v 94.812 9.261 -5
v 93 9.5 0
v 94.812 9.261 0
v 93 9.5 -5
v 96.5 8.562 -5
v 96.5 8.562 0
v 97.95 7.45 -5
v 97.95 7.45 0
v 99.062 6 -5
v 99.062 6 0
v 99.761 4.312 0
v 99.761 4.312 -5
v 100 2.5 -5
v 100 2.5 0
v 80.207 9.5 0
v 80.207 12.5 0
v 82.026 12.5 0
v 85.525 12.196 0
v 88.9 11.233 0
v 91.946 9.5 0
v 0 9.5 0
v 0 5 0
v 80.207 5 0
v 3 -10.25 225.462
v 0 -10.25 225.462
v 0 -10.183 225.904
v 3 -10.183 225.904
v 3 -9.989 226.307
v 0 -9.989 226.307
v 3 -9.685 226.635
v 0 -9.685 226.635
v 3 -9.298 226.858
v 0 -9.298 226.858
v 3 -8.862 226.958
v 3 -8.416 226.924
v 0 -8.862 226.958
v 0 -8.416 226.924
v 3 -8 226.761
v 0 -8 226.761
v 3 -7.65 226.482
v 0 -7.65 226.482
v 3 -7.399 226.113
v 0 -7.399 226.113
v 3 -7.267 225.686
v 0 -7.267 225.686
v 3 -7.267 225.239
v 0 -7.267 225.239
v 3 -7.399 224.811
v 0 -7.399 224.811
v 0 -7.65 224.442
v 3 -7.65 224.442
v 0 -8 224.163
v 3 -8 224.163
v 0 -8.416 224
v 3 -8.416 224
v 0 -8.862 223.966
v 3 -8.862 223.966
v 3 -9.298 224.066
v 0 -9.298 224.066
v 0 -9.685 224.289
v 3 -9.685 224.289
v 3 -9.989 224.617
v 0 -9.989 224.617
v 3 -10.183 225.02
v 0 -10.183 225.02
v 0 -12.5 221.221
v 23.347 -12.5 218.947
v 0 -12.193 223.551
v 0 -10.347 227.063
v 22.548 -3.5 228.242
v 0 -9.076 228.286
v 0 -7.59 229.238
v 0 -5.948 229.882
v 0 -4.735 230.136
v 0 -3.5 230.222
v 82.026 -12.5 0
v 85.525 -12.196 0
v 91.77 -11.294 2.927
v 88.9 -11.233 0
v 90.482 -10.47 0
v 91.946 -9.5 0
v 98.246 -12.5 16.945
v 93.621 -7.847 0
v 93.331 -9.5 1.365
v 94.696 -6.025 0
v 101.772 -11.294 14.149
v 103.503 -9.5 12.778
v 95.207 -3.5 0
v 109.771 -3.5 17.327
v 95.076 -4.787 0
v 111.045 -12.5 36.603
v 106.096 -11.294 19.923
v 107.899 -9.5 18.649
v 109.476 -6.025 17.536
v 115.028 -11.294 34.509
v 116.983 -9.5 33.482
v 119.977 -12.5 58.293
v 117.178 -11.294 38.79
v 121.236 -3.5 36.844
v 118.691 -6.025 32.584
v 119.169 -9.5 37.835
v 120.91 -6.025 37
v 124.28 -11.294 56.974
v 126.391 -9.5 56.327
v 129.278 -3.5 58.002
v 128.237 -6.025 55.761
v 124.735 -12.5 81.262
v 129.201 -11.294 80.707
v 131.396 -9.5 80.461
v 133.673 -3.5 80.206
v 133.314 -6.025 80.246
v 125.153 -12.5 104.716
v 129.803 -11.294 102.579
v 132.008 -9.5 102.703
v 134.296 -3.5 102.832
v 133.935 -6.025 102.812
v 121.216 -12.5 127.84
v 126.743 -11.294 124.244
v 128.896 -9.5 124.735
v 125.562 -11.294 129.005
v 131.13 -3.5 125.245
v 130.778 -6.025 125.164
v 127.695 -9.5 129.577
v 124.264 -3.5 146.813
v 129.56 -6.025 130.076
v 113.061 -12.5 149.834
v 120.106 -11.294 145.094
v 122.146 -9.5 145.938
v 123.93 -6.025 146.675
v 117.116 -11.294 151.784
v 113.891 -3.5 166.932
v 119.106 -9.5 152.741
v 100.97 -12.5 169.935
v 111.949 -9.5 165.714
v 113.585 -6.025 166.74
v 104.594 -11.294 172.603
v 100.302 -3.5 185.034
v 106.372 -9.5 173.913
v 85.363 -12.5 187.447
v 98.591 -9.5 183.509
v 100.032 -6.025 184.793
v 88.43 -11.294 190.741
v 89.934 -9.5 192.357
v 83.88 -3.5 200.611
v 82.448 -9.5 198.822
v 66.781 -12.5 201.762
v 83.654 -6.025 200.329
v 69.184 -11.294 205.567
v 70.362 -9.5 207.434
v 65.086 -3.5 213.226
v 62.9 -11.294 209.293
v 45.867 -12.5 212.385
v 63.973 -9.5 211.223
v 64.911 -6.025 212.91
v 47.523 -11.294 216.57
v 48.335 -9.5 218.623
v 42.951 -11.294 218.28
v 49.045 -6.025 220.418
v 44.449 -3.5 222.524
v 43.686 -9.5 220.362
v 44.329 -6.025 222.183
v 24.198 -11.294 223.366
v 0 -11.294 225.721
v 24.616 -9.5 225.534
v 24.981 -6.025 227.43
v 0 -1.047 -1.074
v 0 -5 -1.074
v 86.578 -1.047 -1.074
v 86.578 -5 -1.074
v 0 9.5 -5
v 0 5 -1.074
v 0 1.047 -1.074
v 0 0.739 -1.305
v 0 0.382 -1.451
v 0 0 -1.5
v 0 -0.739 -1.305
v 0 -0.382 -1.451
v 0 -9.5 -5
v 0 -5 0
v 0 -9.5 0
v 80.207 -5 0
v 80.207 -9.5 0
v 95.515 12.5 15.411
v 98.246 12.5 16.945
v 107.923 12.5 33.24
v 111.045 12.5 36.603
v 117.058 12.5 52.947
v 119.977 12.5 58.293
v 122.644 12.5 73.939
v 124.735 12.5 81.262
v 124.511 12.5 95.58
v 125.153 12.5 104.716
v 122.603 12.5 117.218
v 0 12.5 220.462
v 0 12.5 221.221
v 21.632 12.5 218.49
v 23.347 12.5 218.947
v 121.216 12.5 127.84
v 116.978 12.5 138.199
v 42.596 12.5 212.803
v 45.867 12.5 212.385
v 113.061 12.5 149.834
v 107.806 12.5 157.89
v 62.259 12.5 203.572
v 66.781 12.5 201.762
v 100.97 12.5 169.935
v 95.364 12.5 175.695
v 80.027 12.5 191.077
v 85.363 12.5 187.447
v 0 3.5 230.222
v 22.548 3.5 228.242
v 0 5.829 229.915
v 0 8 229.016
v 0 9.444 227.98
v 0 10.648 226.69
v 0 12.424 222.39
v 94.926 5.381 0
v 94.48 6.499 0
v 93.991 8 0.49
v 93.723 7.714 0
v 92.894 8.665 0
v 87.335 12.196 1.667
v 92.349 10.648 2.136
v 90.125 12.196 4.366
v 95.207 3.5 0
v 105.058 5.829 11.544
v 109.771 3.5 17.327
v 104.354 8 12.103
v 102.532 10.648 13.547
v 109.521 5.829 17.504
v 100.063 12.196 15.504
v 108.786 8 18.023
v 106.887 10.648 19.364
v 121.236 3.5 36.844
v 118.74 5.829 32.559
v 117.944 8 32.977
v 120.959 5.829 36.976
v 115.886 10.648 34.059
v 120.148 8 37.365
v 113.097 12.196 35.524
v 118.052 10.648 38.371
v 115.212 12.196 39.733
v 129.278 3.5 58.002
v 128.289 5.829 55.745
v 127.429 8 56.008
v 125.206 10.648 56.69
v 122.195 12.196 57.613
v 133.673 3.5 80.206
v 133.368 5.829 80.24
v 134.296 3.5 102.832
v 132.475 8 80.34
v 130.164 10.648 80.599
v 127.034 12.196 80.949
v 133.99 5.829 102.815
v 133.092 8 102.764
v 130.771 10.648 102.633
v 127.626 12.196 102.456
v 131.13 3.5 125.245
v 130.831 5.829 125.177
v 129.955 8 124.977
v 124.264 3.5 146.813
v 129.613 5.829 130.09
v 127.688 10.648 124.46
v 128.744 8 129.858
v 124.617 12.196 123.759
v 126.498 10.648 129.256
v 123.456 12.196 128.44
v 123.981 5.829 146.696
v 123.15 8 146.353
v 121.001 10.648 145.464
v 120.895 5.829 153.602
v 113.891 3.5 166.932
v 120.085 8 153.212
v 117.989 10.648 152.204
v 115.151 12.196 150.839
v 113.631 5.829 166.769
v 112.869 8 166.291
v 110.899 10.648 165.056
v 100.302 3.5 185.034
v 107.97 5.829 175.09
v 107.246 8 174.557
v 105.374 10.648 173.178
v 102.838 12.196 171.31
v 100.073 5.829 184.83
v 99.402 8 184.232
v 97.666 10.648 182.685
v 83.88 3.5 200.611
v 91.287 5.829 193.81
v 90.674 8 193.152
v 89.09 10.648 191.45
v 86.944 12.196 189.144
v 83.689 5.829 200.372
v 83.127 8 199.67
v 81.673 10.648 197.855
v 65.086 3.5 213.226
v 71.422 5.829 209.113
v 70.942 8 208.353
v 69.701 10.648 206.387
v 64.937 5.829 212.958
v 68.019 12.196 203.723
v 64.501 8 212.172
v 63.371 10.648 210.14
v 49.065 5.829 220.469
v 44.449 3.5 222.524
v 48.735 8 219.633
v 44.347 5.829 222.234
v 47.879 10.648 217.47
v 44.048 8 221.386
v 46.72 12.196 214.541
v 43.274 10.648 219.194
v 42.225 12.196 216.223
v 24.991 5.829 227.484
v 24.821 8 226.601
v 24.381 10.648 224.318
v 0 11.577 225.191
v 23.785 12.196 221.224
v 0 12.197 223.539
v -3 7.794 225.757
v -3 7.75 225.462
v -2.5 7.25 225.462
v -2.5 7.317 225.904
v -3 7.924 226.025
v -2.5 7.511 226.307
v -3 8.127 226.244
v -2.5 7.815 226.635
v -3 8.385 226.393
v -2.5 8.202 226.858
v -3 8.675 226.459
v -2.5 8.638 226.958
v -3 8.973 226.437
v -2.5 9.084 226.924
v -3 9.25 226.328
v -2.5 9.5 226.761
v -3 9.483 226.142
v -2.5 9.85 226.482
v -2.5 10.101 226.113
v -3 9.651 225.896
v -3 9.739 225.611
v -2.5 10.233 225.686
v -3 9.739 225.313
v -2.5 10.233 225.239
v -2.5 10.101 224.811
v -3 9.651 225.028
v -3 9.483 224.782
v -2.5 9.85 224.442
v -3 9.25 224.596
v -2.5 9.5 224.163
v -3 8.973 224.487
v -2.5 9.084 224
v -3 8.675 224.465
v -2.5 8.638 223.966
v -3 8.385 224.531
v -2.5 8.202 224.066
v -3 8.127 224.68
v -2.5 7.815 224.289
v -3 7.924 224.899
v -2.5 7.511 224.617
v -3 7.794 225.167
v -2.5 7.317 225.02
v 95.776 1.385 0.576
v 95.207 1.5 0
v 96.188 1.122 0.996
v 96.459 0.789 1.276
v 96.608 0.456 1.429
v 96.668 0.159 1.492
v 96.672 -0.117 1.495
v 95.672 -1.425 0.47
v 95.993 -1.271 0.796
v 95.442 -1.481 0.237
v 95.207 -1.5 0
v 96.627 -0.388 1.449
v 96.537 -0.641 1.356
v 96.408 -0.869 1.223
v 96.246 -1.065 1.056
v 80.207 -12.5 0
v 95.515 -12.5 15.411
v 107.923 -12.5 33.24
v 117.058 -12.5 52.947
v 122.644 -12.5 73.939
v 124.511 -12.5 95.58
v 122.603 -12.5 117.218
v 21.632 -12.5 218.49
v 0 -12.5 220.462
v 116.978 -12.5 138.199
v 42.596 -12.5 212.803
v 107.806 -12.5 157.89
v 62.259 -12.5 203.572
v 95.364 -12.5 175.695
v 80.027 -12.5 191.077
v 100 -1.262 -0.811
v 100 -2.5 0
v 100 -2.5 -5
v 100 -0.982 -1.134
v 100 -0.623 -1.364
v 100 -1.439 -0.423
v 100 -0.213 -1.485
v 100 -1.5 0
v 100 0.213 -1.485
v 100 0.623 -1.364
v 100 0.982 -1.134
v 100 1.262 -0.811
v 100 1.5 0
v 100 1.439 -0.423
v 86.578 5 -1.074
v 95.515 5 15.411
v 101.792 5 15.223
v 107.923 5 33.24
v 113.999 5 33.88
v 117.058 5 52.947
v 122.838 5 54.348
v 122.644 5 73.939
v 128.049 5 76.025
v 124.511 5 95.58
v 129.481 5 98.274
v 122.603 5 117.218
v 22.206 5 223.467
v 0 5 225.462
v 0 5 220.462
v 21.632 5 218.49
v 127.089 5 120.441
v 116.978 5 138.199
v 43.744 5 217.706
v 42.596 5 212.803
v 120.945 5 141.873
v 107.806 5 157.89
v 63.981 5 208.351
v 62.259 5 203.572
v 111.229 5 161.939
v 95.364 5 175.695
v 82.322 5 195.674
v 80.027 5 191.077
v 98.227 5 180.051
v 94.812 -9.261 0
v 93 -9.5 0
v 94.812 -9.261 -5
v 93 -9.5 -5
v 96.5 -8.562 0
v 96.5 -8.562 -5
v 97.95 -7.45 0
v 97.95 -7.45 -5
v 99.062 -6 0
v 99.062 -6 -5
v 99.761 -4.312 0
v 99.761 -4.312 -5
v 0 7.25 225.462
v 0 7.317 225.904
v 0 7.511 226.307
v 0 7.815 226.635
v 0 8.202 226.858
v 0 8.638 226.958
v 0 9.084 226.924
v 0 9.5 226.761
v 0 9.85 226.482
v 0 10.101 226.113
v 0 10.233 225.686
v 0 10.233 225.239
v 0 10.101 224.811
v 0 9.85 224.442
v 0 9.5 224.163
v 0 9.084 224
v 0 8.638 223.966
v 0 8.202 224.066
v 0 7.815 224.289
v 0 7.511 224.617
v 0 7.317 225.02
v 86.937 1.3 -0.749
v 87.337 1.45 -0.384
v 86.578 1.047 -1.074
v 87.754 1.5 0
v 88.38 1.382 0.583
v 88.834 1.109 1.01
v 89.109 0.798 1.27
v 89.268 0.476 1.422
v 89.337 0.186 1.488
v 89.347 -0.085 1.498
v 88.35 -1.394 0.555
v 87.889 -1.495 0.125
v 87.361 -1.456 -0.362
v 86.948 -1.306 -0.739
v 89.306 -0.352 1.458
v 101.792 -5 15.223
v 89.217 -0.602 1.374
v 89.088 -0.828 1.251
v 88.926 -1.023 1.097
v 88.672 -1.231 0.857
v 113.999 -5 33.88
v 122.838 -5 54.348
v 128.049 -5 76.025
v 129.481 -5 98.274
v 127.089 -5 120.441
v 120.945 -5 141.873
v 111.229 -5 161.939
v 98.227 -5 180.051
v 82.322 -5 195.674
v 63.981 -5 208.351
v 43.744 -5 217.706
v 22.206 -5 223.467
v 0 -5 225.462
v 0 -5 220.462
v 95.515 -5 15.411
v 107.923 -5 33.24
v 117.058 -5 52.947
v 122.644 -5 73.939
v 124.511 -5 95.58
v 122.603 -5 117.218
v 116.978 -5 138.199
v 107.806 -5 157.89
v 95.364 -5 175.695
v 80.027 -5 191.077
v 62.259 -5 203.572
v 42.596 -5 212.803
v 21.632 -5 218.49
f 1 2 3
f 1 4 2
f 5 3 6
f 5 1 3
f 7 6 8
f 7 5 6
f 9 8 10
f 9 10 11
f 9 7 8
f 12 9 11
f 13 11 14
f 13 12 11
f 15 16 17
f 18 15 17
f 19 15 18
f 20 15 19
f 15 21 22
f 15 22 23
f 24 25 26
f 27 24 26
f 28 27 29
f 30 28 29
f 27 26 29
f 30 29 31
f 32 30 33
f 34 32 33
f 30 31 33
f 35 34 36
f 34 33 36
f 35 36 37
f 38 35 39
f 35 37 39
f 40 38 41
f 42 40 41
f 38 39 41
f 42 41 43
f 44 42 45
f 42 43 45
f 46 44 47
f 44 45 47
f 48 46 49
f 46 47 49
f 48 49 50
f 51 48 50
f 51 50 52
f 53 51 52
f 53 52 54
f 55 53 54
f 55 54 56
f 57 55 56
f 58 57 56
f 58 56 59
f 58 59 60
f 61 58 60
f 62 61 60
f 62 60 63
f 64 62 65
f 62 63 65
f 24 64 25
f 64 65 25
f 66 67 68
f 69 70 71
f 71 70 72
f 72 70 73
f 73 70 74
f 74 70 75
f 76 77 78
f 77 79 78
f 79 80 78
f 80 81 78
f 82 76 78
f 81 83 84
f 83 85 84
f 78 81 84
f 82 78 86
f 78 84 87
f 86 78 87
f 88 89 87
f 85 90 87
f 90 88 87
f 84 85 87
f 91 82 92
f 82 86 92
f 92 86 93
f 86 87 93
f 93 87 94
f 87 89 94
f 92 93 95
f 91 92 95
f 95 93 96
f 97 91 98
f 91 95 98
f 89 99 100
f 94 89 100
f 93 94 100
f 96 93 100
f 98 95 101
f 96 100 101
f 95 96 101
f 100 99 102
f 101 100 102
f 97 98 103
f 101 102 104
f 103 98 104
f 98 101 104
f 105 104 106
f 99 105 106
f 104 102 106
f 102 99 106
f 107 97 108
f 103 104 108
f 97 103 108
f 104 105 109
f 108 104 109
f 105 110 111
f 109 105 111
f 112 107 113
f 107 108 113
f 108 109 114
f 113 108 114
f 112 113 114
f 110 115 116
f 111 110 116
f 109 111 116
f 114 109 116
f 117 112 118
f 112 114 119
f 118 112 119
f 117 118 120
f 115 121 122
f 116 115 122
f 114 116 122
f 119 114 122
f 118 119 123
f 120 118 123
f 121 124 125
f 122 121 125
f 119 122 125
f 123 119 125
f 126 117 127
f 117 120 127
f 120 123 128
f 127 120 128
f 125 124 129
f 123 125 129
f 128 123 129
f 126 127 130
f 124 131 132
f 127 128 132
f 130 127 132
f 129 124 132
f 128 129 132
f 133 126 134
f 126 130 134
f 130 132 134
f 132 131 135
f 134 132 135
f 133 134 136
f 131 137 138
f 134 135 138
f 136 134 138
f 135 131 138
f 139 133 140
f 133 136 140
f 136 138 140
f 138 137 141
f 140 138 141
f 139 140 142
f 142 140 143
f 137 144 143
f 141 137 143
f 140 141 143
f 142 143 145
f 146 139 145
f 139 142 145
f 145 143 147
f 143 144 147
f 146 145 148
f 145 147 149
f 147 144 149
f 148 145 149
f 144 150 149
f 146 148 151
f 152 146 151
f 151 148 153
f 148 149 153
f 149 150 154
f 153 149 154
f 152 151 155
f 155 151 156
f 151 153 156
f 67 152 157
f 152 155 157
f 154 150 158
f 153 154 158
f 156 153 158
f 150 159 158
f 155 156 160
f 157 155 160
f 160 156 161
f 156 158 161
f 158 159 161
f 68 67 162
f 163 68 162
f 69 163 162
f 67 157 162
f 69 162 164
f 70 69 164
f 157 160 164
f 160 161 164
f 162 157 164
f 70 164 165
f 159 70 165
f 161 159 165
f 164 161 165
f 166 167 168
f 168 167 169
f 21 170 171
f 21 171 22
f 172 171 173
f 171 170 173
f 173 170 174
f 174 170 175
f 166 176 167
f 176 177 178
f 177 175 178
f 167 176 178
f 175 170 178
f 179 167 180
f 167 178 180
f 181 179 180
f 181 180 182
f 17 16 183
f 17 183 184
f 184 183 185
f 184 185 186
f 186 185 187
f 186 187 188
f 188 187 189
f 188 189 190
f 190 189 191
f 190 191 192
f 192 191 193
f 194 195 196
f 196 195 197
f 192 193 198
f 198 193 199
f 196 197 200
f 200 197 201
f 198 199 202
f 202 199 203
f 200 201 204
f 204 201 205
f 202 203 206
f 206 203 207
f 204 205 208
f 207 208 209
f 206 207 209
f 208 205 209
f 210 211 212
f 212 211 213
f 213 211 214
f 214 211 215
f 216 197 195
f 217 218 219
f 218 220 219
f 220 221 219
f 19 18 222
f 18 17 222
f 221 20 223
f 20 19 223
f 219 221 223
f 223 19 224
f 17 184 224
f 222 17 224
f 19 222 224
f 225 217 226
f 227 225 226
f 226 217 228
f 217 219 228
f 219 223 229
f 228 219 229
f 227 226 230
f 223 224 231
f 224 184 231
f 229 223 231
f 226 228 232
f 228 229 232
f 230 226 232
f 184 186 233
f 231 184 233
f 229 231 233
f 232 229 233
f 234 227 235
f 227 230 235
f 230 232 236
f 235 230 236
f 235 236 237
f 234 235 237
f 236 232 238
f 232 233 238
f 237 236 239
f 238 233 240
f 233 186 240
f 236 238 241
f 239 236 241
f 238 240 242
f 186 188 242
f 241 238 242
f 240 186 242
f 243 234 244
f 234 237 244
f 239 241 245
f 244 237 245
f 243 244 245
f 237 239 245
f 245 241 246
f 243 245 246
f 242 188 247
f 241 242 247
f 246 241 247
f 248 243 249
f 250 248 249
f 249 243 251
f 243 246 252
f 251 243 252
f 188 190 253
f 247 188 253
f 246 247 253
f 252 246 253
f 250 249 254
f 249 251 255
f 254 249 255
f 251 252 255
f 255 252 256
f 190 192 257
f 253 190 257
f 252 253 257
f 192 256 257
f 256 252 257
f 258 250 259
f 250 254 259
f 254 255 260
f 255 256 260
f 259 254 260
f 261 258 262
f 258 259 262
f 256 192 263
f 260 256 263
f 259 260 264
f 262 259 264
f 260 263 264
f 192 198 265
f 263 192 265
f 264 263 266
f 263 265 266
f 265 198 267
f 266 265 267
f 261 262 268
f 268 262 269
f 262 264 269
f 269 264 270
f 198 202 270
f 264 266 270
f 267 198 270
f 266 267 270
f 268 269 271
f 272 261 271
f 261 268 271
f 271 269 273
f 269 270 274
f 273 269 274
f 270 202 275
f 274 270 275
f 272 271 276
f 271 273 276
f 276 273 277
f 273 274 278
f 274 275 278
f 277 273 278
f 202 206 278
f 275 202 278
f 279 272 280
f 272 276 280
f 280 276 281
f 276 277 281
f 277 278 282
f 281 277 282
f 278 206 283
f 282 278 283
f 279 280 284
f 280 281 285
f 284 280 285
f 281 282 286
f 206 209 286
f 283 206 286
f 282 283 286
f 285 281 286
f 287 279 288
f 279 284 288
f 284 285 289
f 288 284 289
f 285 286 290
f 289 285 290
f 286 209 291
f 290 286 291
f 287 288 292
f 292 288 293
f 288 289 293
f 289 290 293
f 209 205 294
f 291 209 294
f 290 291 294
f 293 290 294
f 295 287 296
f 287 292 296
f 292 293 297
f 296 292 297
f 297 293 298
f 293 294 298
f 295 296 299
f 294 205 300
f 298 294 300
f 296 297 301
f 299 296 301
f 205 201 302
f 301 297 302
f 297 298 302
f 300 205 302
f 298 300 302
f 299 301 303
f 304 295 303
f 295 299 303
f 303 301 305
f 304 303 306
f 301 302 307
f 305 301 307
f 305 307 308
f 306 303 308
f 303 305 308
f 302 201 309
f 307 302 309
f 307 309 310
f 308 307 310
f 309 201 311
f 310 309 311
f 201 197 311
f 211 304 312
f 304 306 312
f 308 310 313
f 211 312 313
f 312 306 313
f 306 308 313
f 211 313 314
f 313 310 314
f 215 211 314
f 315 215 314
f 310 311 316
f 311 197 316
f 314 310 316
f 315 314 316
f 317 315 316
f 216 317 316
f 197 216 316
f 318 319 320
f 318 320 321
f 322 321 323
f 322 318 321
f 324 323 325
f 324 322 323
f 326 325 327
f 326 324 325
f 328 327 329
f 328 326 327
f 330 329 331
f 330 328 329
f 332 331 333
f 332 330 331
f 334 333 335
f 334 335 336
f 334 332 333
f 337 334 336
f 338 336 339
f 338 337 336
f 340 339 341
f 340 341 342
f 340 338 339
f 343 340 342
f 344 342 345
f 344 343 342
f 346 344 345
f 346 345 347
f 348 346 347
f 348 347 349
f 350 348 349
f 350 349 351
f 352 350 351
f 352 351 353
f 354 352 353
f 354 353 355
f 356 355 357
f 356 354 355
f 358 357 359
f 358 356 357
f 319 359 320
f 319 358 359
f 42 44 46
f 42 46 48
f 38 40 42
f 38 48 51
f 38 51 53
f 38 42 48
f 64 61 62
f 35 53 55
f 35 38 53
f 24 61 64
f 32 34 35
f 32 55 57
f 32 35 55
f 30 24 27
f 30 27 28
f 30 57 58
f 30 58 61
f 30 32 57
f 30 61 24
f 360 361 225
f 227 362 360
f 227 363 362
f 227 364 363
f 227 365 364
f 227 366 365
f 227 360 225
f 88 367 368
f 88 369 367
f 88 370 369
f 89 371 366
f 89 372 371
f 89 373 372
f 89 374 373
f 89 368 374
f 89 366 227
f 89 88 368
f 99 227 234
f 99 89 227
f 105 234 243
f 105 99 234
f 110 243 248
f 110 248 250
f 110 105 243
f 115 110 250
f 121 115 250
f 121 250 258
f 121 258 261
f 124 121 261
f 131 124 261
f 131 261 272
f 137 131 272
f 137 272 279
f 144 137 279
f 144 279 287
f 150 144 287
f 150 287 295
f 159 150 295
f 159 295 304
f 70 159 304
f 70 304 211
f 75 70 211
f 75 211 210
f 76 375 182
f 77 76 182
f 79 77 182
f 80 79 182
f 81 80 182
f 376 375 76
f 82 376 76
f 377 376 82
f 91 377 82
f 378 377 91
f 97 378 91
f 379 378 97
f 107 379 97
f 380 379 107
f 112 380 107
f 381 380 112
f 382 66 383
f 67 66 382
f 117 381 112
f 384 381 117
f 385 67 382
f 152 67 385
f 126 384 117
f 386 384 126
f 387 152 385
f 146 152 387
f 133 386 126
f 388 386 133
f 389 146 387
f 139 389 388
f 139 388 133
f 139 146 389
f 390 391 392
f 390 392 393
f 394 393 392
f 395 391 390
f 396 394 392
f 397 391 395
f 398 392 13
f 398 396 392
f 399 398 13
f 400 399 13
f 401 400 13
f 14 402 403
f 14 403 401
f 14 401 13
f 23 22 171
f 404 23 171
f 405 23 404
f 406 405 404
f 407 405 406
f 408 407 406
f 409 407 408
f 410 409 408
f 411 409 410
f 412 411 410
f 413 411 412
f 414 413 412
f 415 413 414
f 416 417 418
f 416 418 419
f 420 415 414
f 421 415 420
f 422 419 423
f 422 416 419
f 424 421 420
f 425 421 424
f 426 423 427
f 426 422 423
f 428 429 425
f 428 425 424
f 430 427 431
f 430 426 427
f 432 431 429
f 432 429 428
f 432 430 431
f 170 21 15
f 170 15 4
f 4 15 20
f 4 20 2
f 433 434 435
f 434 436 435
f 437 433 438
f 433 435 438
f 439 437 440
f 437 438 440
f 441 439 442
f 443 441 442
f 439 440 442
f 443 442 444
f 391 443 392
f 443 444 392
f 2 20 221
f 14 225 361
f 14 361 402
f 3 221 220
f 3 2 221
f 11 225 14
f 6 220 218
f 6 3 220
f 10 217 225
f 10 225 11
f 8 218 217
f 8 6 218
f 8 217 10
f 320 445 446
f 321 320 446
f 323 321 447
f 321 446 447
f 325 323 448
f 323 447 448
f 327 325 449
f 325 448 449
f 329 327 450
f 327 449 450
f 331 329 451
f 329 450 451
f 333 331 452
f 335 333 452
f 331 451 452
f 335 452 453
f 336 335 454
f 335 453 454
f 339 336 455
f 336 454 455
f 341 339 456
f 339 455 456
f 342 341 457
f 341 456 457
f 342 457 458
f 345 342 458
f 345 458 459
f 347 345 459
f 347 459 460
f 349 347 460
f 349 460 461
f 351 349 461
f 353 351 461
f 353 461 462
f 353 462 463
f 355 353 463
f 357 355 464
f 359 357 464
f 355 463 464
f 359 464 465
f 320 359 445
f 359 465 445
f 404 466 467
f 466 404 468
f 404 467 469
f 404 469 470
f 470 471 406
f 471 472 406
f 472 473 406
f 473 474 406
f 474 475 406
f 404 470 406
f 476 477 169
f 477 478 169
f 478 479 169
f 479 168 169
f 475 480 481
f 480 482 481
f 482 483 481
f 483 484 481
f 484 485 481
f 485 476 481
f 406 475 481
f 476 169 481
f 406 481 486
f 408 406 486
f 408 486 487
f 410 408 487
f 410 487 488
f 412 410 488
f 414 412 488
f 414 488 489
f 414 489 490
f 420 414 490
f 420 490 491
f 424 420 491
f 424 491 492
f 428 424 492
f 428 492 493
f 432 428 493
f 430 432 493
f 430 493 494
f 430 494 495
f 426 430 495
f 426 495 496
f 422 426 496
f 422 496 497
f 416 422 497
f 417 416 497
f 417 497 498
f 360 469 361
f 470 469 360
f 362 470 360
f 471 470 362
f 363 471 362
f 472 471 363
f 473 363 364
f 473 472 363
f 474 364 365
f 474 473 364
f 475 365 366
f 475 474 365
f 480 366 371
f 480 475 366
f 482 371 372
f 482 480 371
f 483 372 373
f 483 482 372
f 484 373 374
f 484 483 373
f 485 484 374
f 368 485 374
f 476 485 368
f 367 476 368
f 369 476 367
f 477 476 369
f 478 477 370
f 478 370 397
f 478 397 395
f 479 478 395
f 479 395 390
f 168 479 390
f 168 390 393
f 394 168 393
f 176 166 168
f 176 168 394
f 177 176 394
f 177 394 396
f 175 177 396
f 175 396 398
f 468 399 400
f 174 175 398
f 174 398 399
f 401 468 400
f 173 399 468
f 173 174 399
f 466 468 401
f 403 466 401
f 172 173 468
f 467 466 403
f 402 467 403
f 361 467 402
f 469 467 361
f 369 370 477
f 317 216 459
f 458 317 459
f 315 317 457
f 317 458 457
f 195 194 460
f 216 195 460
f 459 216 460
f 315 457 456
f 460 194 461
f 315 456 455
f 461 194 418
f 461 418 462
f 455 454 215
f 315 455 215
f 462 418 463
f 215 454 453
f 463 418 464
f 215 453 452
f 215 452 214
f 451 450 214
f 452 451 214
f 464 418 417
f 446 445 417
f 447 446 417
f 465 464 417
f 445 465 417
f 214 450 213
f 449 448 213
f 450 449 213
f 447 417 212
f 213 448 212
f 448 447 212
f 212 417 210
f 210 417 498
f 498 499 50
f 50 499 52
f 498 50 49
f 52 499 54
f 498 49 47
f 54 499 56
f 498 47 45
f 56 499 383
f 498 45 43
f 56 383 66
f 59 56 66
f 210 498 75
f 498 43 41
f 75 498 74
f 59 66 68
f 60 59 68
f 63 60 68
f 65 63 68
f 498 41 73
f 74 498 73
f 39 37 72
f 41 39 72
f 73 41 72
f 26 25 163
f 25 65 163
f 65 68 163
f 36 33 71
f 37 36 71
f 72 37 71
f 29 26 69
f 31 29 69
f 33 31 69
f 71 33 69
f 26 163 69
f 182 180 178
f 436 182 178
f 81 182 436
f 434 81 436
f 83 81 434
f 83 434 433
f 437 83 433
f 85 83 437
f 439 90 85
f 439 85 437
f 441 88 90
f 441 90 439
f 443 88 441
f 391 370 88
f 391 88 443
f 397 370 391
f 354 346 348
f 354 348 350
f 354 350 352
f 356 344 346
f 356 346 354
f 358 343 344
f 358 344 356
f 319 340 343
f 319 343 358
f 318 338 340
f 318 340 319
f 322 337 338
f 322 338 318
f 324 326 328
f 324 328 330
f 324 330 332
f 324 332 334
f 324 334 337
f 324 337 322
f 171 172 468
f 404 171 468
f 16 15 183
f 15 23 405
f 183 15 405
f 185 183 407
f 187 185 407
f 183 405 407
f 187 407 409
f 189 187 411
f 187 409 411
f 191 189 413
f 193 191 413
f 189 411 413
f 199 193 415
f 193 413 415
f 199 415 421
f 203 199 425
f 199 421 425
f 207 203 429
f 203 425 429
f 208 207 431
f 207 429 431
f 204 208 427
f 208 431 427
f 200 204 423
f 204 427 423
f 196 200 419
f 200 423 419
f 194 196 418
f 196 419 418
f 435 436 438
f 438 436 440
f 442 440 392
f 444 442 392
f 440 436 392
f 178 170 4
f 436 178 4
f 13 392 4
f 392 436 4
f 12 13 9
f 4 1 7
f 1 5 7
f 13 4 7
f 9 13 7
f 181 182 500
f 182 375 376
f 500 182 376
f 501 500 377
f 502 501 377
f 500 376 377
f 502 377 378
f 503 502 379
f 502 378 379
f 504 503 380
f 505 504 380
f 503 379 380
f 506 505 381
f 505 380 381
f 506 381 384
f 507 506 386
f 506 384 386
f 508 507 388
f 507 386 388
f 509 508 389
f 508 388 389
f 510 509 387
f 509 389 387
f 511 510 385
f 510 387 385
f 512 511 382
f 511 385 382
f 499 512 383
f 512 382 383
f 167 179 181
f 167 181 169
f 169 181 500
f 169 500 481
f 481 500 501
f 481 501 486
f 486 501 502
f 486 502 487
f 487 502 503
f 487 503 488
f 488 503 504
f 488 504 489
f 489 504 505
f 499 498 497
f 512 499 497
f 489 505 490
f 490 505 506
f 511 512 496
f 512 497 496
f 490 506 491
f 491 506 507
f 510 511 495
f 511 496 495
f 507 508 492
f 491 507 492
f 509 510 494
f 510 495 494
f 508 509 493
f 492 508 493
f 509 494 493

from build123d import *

# Parameters (mm, degrees)
F1_DEPTH     = 12.5
F3_DEPTH     = 145
F4_W         = 200
F4_H         = 19
F5_DEPTH     = 5
F7_DEPTH     = 5
F8_R         = 1
F9_DEPTH     = 135.4900855741
F11_T3_ANGLE = 288.8835060345
F11_T7_ANGLE = 288.8835060345
F12_W        = 164.3678992987
F12_H        = 299.086984247
F13_DEPTH    = 15
F14_R        = 1.5
F15_DEPTH    = 3
F16_R        = 1.5
F17_DEPTH    = 3
F18_SIZE     = 0.5
F19_R        = 1.5
F20_DEPTH    = 134.5119145259
F21_R        = 7


# Not quite as in the source:
# - a fillet or chamfer that OpenCascade refuses, or shapes differently, is made with other operations: its cross-section is extruded or revolved along the edge and cut away or added


with BuildPart() as f1:
    # F0 (on Front) → F1 (new body, symmetric)
    with BuildSketch(Plane.XZ):
        with BuildLine():
            ThreePointArc((95.206740787, 0), (-0.4890855741, 230.2224176182), (-96.1849119353, 0))
            Line((-96.1849119353, 0), (95.206740787, 0))
        make_face()
    extrude(amount=F1_DEPTH, both=True)

    # F2 (on face) → F3 (cut, symmetric)
    with BuildSketch(Plane.XZ.offset(12.5)):
        with BuildLine():
            ThreePointArc((80.206740787, 0), (-0.4890855741, 220.4629960136), (-81.1849119353, 0))
            Line((-81.1849119353, 0), (80.206740787, 0))
        make_face()
    extrude(amount=F3_DEPTH, both=True, mode=Mode.SUBTRACT)

    # F4 (on Top) → F5 (join)
    with BuildSketch(Plane.XY):
        Rectangle(F4_W, F4_H)
    extrude(amount=-F5_DEPTH)

    # F6 (on Front) → F7 (cut, symmetric)
    with BuildSketch(Plane.XZ):
        with BuildLine():
            ThreePointArc((86.5775826458, -1.0740190898), (-0.4890855741, 225.4629960136), (-87.5557537941, -1.0740190898))
            Line((-87.5557537941, -1.0740190898), (86.5775826458, -1.0740190898))
        make_face()
    extrude(amount=F7_DEPTH, both=True, mode=Mode.SUBTRACT)

    # F8 (on Right) → F9 (cut, through all)
    with BuildSketch(Plane.YZ):
        Circle(F8_R)
    extrude(amount=-F9_DEPTH, mode=Mode.SUBTRACT)

    # F11: fillet of radius 9 on 2 edges, made by hand


with BuildPart() as f11_tool1:
    # F11_s2 → F11_t3 (revolve)
    with BuildSketch(Plane(origin=(44.7250174756, 0, 31.9706955431), x_dir=(0, 1, 0), z_dir=(-0.8135247542, 0, -0.5815302867))):
        with BuildLine():
            ThreePointArc((-12.5, 48.2497880385), (-9.8639610307, 54.6137490692), (-3.5, 57.2497880385))
            Line((-3.5, 57.2497880385), (-3.5, 57.4297880385))
            Line((-3.5, 57.4297880385), (-12.68, 57.4297880385))
            Line((-12.68, 57.4297880385), (-12.68, 48.2497880385))
            Line((-12.68, 48.2497880385), (-12.5, 48.2497880385))
        make_face()
    revolve(axis=Axis((-0.4890855741, -12.5, 95.2224176182), (0, -1, 0)), revolution_arc=F11_T3_ANGLE)

    split(bisect_by=Plane.XY, keep=Keep.TOP)


with BuildPart() as f11_tool5:
    # F11_s6 → F11_t7 (revolve)
    with BuildSketch(Plane(origin=(44.7250174756, 0, 31.9706955431), x_dir=(0, 1, 0), z_dir=(-0.8135247542, 0, -0.5815302867))):
        with BuildLine():
            ThreePointArc((3.5, 57.2497880385), (9.8639610307, 54.6137490692), (12.5, 48.2497880385))
            Line((12.5, 48.2497880385), (12.68, 48.2497880385))
            Line((12.68, 48.2497880385), (12.68, 57.4297880385))
            Line((12.68, 57.4297880385), (3.5, 57.4297880385))
            Line((3.5, 57.4297880385), (3.5, 57.2497880385))
        make_face()
    revolve(axis=Axis((-0.4890855741, 12.5, 95.2224176182), (0, -1, 0)), revolution_arc=F11_T7_ANGLE)

    split(bisect_by=Plane.XY, keep=Keep.TOP)


with BuildPart() as f1_1:
    add(f1.part)

    # F11_t9: cut F11_tool1, F11_tool5
    add([f11_tool1.part, f11_tool5.part], mode=Mode.SUBTRACT)

    # F12 (on Front) → F13 (cut, symmetric)
    with BuildSketch(Plane.XZ):
        with Locations((-82.1839496493, 121.752621606)):
            Rectangle(F12_W, F12_H)
    extrude(amount=F13_DEPTH, both=True, mode=Mode.SUBTRACT)

    # F14 (on face) → F15 (join)
    with BuildSketch(Plane(origin=(0, 0, 0), x_dir=(0, -1, 0), z_dir=(-1, 0, 0))):
        with Locations((-8.75, 225.4620759923)):
            Circle(F14_R)
    extrude(amount=F15_DEPTH)

    # F16 (on face) → F17 (cut)
    with BuildSketch(Plane(origin=(0, 0, 0), x_dir=(0, -1, 0), z_dir=(-1, 0, 0))):
        with Locations((8.75, 225.4620759923)):
            Circle(F16_R)
    extrude(amount=-F17_DEPTH, mode=Mode.SUBTRACT)

    # F18
    f18_edges = [f1_1.edges().sort_by_distance(p)[0] for p in [
        (-3, 10.25, 225.462076),
    ]]
    chamfer(f18_edges, length=F18_SIZE)

    # F19 (on Right) → F20 (cut, through all)
    with BuildSketch(Plane.YZ):
        Circle(F19_R)
    extrude(amount=F20_DEPTH, mode=Mode.SUBTRACT)

    # F21
    f21_edges = [f1_1.edges().sort_by_distance(p)[0] for p in [
        (100, 9.5, -2.5),
        (100, -9.5, -2.5),
    ]]
    fillet(f21_edges, radius=F21_R)


solid = f1_1.part
